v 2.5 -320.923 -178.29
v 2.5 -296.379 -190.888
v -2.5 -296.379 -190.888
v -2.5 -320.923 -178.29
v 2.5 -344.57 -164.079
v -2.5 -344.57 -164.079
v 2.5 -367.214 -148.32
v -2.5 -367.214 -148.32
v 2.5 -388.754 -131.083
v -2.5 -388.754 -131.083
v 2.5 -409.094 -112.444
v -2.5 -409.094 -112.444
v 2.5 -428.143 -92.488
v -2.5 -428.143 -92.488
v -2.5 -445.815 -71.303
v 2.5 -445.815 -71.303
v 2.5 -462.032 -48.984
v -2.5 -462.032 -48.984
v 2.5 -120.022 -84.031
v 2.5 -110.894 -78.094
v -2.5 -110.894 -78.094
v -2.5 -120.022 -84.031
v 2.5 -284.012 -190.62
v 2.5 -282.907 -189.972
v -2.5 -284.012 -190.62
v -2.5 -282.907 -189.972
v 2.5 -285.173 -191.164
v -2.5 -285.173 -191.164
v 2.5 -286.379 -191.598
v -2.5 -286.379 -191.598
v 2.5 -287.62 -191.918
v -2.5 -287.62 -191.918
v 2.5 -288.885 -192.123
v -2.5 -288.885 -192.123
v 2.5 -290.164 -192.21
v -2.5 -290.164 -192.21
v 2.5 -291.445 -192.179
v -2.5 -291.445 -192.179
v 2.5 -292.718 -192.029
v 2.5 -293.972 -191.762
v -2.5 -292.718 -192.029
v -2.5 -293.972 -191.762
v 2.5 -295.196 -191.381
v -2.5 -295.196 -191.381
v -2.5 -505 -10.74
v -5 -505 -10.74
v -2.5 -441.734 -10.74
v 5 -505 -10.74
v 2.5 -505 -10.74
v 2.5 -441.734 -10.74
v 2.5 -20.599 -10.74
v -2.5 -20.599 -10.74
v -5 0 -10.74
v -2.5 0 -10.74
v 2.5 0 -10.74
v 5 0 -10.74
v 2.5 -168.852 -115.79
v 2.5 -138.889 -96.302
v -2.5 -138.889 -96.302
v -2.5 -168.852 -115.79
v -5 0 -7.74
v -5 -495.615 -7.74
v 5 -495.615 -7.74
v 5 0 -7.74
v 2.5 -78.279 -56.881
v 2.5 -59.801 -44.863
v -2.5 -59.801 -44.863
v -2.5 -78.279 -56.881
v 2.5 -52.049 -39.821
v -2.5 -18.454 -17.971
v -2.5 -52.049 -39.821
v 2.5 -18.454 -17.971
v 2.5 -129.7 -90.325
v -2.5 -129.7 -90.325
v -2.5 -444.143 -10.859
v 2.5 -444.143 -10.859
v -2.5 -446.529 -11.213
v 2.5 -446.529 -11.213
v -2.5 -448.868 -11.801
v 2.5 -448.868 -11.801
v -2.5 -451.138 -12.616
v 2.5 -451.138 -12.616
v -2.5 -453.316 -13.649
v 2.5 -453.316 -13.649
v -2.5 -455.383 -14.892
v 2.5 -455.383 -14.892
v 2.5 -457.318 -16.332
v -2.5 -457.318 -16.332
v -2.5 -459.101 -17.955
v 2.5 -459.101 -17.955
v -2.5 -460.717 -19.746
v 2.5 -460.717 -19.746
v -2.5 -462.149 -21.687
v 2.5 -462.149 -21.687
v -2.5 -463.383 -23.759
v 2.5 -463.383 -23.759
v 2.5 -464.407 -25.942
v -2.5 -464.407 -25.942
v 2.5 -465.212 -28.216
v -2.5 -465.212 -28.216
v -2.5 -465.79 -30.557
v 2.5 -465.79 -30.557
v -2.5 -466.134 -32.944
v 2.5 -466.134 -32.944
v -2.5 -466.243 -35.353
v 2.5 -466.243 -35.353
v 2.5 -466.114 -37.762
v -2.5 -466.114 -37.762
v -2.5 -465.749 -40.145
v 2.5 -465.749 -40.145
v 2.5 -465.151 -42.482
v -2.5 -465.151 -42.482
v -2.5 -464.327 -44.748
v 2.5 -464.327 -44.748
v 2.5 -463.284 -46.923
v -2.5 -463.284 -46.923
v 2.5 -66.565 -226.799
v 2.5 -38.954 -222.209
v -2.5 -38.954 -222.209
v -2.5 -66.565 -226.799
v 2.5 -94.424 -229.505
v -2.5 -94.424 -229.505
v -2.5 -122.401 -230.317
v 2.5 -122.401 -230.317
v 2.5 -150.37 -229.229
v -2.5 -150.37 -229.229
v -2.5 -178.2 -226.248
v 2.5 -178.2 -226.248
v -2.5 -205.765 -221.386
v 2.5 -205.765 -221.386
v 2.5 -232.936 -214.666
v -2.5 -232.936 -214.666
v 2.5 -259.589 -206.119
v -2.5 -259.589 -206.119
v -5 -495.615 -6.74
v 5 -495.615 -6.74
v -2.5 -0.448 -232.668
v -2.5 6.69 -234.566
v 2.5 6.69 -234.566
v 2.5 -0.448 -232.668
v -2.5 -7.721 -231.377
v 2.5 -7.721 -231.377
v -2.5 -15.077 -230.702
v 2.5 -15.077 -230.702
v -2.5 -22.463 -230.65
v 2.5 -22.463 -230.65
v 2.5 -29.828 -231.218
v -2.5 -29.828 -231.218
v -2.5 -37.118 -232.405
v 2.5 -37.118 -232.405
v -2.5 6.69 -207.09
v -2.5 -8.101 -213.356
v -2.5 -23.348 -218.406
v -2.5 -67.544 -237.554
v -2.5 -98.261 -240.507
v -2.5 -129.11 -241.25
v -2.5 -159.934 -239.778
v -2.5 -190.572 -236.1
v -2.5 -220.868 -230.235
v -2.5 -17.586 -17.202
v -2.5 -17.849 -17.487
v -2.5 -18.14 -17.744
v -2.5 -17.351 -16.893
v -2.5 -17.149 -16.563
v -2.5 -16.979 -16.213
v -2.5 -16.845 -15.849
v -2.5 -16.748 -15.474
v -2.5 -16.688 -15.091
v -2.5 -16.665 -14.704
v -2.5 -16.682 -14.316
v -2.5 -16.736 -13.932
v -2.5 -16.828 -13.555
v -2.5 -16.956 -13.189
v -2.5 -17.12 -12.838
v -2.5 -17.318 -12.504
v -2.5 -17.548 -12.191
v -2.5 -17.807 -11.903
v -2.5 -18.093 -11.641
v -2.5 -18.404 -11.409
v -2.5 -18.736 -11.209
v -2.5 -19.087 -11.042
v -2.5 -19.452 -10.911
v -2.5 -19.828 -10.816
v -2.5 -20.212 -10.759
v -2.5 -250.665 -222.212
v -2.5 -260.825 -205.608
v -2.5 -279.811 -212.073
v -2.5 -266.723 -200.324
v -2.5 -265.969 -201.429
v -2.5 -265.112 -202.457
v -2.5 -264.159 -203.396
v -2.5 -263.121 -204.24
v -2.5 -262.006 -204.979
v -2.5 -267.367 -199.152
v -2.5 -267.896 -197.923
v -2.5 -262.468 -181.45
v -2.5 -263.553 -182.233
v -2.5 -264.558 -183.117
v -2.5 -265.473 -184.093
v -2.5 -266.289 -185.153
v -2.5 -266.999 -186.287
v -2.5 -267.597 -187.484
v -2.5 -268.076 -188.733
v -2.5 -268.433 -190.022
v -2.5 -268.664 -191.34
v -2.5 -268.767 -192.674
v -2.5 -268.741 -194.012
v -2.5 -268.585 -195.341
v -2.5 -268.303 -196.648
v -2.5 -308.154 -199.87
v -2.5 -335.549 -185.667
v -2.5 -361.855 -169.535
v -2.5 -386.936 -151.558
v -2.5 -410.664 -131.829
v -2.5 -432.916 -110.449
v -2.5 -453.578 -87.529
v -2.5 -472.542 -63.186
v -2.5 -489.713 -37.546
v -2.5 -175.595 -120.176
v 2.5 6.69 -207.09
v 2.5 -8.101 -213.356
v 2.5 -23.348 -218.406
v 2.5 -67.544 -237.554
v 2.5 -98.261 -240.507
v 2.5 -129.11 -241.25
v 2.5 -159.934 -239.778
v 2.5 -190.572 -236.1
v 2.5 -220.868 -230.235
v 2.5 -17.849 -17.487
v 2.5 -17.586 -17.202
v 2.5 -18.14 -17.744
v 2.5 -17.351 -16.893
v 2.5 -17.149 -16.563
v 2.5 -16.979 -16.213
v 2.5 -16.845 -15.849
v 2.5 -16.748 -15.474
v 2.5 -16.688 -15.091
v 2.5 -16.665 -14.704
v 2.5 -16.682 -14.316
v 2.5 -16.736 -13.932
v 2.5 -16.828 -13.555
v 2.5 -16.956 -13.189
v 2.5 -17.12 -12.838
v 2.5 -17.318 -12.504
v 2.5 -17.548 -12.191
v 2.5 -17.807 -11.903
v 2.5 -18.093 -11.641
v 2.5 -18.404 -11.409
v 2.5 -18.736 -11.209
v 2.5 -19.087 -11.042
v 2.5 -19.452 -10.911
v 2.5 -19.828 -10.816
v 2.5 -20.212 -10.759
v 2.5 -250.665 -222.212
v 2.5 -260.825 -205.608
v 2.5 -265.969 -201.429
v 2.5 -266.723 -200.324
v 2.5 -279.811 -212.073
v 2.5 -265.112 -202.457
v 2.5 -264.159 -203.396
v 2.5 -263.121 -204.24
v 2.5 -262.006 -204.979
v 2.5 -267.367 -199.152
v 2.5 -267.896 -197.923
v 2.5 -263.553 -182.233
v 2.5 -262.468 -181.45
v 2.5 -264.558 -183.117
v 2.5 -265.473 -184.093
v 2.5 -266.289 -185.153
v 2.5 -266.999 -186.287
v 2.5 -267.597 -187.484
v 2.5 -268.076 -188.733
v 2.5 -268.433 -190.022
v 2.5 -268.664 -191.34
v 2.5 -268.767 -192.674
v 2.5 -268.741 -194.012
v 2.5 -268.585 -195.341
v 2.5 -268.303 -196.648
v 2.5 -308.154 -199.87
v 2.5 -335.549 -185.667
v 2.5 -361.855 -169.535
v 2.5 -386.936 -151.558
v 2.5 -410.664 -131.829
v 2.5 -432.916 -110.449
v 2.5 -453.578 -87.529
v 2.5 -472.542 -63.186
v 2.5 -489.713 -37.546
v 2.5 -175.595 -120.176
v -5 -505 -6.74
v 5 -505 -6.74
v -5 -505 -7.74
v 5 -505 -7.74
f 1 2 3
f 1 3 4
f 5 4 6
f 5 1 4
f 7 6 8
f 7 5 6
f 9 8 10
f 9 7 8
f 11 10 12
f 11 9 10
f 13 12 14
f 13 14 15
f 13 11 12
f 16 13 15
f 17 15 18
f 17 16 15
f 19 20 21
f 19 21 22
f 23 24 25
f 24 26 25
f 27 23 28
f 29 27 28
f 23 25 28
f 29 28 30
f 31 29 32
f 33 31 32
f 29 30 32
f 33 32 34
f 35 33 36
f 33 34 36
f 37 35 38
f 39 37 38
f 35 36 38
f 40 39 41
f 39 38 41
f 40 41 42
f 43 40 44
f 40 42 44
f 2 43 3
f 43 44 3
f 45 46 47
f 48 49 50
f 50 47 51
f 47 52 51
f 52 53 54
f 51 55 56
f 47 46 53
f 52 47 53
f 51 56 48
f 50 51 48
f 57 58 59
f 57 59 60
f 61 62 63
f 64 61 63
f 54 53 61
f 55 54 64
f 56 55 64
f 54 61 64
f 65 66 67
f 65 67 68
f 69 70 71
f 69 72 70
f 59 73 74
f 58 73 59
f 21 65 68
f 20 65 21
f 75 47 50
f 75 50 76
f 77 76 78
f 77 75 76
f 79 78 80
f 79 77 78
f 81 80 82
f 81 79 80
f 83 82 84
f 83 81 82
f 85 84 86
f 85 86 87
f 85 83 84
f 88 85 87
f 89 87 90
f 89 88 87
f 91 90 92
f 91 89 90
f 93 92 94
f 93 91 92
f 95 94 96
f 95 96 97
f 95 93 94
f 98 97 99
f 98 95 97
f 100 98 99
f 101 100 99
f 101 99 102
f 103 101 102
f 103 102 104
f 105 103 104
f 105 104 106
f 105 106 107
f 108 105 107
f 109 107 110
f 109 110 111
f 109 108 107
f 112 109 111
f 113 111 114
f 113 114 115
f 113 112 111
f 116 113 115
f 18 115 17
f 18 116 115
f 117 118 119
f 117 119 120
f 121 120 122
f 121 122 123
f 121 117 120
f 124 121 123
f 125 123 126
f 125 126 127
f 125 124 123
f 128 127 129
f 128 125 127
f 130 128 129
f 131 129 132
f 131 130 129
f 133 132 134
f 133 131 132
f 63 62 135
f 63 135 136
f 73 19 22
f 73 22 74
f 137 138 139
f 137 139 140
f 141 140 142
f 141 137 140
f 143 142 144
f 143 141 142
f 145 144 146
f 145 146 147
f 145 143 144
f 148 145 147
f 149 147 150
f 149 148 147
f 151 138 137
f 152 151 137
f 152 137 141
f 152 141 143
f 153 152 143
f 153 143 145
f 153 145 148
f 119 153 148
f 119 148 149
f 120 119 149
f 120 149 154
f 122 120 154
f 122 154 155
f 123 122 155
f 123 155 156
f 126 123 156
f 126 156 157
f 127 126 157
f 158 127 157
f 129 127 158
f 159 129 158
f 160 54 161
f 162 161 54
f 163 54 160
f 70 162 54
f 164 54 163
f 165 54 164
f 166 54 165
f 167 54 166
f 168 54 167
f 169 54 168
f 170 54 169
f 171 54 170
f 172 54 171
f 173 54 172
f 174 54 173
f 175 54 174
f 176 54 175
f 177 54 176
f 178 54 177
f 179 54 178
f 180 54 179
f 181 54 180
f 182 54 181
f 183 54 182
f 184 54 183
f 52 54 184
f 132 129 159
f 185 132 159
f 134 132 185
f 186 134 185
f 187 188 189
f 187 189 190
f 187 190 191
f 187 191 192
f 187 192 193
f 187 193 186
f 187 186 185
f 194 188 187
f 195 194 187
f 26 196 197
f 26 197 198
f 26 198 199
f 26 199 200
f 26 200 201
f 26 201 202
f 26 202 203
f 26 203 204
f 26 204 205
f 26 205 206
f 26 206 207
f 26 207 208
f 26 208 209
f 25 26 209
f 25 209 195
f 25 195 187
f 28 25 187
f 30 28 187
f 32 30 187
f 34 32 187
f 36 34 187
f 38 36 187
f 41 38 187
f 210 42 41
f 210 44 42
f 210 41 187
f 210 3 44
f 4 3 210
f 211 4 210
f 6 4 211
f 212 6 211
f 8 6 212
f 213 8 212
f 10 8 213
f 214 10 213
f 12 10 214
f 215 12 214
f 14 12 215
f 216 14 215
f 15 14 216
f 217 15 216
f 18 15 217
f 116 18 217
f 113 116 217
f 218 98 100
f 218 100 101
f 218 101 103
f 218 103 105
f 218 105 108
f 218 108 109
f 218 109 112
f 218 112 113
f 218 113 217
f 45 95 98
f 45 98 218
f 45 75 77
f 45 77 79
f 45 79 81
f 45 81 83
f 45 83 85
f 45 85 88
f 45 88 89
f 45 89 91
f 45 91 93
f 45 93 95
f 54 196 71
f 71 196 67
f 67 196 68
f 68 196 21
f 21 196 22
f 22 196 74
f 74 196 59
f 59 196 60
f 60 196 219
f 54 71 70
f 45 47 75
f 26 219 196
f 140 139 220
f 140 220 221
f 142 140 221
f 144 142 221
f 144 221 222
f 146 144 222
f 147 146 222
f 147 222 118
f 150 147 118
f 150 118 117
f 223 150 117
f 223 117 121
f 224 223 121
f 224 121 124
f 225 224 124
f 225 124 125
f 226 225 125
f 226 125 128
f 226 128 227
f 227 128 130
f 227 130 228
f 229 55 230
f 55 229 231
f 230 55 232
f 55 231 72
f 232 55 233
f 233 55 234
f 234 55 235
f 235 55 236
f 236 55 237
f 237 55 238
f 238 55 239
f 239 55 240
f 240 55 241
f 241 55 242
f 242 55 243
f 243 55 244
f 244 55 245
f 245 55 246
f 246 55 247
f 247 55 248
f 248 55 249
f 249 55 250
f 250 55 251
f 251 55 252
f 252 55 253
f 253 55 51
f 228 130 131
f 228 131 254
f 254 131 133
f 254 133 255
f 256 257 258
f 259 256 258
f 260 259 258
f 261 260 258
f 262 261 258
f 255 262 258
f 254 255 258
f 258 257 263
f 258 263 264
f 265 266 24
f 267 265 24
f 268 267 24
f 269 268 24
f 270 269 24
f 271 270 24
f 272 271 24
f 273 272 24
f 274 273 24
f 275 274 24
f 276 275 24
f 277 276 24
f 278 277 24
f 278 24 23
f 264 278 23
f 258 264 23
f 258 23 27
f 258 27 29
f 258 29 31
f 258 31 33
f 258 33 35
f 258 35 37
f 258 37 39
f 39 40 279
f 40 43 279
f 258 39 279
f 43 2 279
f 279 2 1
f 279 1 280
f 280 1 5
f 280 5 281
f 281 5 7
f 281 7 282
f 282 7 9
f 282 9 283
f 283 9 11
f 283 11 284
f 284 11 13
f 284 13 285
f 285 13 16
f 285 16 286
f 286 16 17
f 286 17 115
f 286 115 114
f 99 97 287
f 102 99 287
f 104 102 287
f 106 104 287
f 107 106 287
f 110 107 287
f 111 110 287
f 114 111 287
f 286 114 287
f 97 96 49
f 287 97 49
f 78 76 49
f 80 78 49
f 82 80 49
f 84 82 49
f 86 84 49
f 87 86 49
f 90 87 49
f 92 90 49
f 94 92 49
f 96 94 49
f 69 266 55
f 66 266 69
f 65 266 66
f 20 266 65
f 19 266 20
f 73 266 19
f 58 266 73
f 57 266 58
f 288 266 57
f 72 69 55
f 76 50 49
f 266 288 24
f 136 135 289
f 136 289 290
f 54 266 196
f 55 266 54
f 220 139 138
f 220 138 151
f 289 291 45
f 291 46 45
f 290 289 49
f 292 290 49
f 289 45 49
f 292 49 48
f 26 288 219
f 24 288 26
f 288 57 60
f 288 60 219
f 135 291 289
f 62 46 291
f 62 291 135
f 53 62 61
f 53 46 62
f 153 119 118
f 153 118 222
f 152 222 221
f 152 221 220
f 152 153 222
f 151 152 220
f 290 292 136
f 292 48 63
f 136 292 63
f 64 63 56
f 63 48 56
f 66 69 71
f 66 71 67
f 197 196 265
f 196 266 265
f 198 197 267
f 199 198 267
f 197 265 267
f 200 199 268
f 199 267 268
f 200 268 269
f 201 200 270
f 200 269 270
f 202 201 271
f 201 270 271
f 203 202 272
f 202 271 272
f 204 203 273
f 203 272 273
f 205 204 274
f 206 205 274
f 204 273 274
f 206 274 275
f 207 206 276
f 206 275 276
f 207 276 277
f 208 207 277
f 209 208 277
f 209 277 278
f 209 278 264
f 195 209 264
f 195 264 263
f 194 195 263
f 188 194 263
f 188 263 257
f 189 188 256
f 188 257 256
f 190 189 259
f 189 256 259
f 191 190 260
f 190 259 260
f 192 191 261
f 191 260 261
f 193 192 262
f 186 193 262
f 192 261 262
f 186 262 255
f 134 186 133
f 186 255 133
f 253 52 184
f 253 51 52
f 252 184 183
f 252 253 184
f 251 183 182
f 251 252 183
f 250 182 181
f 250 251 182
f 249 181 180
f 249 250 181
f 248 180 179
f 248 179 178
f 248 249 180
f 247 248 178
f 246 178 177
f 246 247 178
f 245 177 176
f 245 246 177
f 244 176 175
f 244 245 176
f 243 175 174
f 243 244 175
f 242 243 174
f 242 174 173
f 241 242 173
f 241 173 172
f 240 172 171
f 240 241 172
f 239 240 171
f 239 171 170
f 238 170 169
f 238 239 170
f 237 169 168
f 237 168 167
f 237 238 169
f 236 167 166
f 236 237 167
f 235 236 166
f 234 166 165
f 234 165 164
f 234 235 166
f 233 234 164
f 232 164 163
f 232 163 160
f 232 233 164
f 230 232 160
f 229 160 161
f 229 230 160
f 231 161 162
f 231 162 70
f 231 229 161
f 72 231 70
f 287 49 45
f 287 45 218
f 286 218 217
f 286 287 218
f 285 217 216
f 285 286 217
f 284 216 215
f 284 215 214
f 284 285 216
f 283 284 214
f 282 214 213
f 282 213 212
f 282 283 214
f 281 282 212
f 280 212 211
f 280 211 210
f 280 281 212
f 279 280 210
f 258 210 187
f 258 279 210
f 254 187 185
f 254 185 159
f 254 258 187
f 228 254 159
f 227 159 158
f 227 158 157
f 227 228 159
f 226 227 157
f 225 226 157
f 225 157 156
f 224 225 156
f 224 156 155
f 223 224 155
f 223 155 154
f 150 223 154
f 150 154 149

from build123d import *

# Parameters (mm, degrees)
F0_W        = 10
F0_H        = 3
F1_DEPTH    = 505
F3_DEPTH    = 2.5
F4_W        = 10
F4_H        = 9.3853771687
F5_DEPTH    = 1
F6_R        = 13.8620559507
F7_T1_DEPTH = 5
F8_T1_DEPTH = 5
F9_T1_DEPTH = 5
F10_R       = 3.9335934118


# Not quite as in the source:
# - a fillet or chamfer that OpenCascade refuses, or shapes differently, is made with other operations: its cross-section is extruded or revolved along the edge and cut away or added


with BuildPart() as f1:
    # F0 (on Front) → F1 (new body)
    with BuildSketch(Plane.XZ):
        with Locations((0, -9.24)):
            Rectangle(F0_W, F0_H)
    extrude(amount=F1_DEPTH)

    # F2 (on Right) → F3 (join, symmetric)
    with BuildSketch(Plane.YZ):
        with BuildLine():
            Line((-485, -10.74), (-505, -10.74))
            ThreePointArc((-505, -10.74), (-493.7857076195, -12.9341617837), (-482.5908295993, -15.2253199277))
            ThreePointArc((-482.5908295993, -15.2253199277), (-483.8023342329, -12.9863765535), (-485, -10.74))
        make_face()
        with BuildLine():
            ThreePointArc((-482.5908295993, -15.2253199277), (-493.7857076195, -12.9341617837), (-505, -10.74))
            ThreePointArc((-505, -10.74), (-295.8735946629, -205.4541731306), (-10.8822178841, -226.1272906733))
            Line((-10.8822178841, -226.1272906733), (-10.8822178841, -215.5293727716))
            ThreePointArc((-10.8822178841, -215.5293727716), (-149.5821295238, -229.2858372659), (-284.9469559253, -196.0703351995))
            ThreePointArc((-284.9469559253, -196.0703351995), (-287.1338212994, -195.111371401), (-289.3150994302, -194.1397657983))
            ThreePointArc((-289.3150994302, -194.1397657983), (-400.6140653387, -120.5204756417), (-482.5908295993, -15.2253199277))
        make_face()
        with BuildLine():
            Line((-175.5948523726, -120.1757838434), (-289.3150994302, -194.1397657983))
            ThreePointArc((-289.3150994302, -194.1397657983), (-287.1338212994, -195.111371401), (-284.9469559253, -196.0703351995))
            Line((-284.9469559253, -196.0703351995), (-164.6339868931, -117.8184275517))
            Line((-164.6339868931, -117.8184275517), (0, -10.74))
            Line((0, -10.74), (-7.3364102674, -10.74))
            Line((-7.3364102674, -10.74), (-52.0490416838, -39.8212265081))
            Line((-52.0490416838, -39.8212265081), (-59.8008067738, -44.8629972399))
            Line((-59.8008067738, -44.8629972399), (-69.1519232492, -50.9449907999))
            Line((-69.1519232492, -50.9449907999), (-78.2792164974, -56.881409077))
            Line((-78.2792164974, -56.881409077), (-110.8941655597, -78.0942675285))
            Line((-110.8941655597, -78.0942675285), (-120.0217871415, -84.0308993547))
            Line((-120.0217871415, -84.0308993547), (-129.6997254261, -90.3254587772))
            Line((-129.6997254261, -90.3254587772), (-138.8888255597, -96.3020764336))
            Line((-138.8888255597, -96.3020764336), (-168.8523264487, -115.7904252229))
            Line((-168.8523264487, -115.7904252229), (-175.5948523726, -120.1757838434))
        make_face()
        Polygon((-10.8822178841, -215.5293727716), (-10.8822178841, -226.1272906733), (6.6898409277, -234.5661967993), (6.6898409277, -207.0904666456), align=None)
    extrude(amount=F3_DEPTH, both=True)

    # F4 (on face) → F5 (join)
    with BuildSketch(Plane.XY.offset(-7.74)):
        with Locations((0, -500.3073114157)):
            Rectangle(F4_W, F4_H)
    extrude(amount=F5_DEPTH)

    # F6
    f6_edges = [f1.edges().sort_by_distance(p)[0] for p in [
        (0, -284.946956, -196.070335),
        (0, -289.315099, -194.139766),
    ]]
    fillet(f6_edges, radius=F6_R)

    # F7: fillet of radius 24.5086487231 on 1 edges, made by hand

    # F7_s2 → F7_t1 (join)
    with BuildSketch(Plane.YZ.offset(-2.5)):
        with BuildLine():
            ThreePointArc((-441.73429524, -10.74), (-463.3828258275, -23.7588712825), (-462.0321746683, -48.9843668676))
            ThreePointArc((-462.0321746683, -48.9843668676), (-474.0334147231, -30.1728667078), (-485, -10.74))
            Line((-485, -10.74), (-441.73429524, -10.74))
        make_face()
    extrude(amount=F7_T1_DEPTH)

    # F8: fillet of radius 198.8084962623 on 1 edges, made by hand

    # F8_s2 → F8_t1 (join)
    with BuildSketch(Plane.YZ.offset(-2.5)):
        with BuildLine():
            ThreePointArc((-38.9541818345, -222.2094923529), (-15.6734102854, -216.0349668625), (6.6898409277, -207.0904666456))
            Line((6.6898409277, -207.0904666456), (-10.8822178841, -215.5293727716))
            ThreePointArc((-10.8822178841, -215.5293727716), (-24.8597763304, -219.11494661), (-38.9541818345, -222.2094923529))
        make_face()
    extrude(amount=F8_T1_DEPTH)

    # F9: fillet of radius 87.6851690928 on 1 edges, made by hand

    # F9_s2 → F9_t1 (join)
    with BuildSketch(Plane.YZ.offset(-2.5)):
        with BuildLine():
            ThreePointArc((6.6898409277, -234.5661967993), (-15.0768754349, -230.7023497098), (-37.1181822791, -232.4053024821))
            ThreePointArc((-37.1181822791, -232.4053024821), (-23.9509608314, -229.4720686048), (-10.8822178841, -226.1272906733))
            Line((-10.8822178841, -226.1272906733), (6.6898409277, -234.5661967993))
        make_face()
    extrude(amount=F9_T1_DEPTH)

    # F10
    f10_edges = [f1.edges().sort_by_distance(p)[0] for p in [
        (0, -7.33641, -10.74),
    ]]
    fillet(f10_edges, radius=F10_R)


solid = f1.part
